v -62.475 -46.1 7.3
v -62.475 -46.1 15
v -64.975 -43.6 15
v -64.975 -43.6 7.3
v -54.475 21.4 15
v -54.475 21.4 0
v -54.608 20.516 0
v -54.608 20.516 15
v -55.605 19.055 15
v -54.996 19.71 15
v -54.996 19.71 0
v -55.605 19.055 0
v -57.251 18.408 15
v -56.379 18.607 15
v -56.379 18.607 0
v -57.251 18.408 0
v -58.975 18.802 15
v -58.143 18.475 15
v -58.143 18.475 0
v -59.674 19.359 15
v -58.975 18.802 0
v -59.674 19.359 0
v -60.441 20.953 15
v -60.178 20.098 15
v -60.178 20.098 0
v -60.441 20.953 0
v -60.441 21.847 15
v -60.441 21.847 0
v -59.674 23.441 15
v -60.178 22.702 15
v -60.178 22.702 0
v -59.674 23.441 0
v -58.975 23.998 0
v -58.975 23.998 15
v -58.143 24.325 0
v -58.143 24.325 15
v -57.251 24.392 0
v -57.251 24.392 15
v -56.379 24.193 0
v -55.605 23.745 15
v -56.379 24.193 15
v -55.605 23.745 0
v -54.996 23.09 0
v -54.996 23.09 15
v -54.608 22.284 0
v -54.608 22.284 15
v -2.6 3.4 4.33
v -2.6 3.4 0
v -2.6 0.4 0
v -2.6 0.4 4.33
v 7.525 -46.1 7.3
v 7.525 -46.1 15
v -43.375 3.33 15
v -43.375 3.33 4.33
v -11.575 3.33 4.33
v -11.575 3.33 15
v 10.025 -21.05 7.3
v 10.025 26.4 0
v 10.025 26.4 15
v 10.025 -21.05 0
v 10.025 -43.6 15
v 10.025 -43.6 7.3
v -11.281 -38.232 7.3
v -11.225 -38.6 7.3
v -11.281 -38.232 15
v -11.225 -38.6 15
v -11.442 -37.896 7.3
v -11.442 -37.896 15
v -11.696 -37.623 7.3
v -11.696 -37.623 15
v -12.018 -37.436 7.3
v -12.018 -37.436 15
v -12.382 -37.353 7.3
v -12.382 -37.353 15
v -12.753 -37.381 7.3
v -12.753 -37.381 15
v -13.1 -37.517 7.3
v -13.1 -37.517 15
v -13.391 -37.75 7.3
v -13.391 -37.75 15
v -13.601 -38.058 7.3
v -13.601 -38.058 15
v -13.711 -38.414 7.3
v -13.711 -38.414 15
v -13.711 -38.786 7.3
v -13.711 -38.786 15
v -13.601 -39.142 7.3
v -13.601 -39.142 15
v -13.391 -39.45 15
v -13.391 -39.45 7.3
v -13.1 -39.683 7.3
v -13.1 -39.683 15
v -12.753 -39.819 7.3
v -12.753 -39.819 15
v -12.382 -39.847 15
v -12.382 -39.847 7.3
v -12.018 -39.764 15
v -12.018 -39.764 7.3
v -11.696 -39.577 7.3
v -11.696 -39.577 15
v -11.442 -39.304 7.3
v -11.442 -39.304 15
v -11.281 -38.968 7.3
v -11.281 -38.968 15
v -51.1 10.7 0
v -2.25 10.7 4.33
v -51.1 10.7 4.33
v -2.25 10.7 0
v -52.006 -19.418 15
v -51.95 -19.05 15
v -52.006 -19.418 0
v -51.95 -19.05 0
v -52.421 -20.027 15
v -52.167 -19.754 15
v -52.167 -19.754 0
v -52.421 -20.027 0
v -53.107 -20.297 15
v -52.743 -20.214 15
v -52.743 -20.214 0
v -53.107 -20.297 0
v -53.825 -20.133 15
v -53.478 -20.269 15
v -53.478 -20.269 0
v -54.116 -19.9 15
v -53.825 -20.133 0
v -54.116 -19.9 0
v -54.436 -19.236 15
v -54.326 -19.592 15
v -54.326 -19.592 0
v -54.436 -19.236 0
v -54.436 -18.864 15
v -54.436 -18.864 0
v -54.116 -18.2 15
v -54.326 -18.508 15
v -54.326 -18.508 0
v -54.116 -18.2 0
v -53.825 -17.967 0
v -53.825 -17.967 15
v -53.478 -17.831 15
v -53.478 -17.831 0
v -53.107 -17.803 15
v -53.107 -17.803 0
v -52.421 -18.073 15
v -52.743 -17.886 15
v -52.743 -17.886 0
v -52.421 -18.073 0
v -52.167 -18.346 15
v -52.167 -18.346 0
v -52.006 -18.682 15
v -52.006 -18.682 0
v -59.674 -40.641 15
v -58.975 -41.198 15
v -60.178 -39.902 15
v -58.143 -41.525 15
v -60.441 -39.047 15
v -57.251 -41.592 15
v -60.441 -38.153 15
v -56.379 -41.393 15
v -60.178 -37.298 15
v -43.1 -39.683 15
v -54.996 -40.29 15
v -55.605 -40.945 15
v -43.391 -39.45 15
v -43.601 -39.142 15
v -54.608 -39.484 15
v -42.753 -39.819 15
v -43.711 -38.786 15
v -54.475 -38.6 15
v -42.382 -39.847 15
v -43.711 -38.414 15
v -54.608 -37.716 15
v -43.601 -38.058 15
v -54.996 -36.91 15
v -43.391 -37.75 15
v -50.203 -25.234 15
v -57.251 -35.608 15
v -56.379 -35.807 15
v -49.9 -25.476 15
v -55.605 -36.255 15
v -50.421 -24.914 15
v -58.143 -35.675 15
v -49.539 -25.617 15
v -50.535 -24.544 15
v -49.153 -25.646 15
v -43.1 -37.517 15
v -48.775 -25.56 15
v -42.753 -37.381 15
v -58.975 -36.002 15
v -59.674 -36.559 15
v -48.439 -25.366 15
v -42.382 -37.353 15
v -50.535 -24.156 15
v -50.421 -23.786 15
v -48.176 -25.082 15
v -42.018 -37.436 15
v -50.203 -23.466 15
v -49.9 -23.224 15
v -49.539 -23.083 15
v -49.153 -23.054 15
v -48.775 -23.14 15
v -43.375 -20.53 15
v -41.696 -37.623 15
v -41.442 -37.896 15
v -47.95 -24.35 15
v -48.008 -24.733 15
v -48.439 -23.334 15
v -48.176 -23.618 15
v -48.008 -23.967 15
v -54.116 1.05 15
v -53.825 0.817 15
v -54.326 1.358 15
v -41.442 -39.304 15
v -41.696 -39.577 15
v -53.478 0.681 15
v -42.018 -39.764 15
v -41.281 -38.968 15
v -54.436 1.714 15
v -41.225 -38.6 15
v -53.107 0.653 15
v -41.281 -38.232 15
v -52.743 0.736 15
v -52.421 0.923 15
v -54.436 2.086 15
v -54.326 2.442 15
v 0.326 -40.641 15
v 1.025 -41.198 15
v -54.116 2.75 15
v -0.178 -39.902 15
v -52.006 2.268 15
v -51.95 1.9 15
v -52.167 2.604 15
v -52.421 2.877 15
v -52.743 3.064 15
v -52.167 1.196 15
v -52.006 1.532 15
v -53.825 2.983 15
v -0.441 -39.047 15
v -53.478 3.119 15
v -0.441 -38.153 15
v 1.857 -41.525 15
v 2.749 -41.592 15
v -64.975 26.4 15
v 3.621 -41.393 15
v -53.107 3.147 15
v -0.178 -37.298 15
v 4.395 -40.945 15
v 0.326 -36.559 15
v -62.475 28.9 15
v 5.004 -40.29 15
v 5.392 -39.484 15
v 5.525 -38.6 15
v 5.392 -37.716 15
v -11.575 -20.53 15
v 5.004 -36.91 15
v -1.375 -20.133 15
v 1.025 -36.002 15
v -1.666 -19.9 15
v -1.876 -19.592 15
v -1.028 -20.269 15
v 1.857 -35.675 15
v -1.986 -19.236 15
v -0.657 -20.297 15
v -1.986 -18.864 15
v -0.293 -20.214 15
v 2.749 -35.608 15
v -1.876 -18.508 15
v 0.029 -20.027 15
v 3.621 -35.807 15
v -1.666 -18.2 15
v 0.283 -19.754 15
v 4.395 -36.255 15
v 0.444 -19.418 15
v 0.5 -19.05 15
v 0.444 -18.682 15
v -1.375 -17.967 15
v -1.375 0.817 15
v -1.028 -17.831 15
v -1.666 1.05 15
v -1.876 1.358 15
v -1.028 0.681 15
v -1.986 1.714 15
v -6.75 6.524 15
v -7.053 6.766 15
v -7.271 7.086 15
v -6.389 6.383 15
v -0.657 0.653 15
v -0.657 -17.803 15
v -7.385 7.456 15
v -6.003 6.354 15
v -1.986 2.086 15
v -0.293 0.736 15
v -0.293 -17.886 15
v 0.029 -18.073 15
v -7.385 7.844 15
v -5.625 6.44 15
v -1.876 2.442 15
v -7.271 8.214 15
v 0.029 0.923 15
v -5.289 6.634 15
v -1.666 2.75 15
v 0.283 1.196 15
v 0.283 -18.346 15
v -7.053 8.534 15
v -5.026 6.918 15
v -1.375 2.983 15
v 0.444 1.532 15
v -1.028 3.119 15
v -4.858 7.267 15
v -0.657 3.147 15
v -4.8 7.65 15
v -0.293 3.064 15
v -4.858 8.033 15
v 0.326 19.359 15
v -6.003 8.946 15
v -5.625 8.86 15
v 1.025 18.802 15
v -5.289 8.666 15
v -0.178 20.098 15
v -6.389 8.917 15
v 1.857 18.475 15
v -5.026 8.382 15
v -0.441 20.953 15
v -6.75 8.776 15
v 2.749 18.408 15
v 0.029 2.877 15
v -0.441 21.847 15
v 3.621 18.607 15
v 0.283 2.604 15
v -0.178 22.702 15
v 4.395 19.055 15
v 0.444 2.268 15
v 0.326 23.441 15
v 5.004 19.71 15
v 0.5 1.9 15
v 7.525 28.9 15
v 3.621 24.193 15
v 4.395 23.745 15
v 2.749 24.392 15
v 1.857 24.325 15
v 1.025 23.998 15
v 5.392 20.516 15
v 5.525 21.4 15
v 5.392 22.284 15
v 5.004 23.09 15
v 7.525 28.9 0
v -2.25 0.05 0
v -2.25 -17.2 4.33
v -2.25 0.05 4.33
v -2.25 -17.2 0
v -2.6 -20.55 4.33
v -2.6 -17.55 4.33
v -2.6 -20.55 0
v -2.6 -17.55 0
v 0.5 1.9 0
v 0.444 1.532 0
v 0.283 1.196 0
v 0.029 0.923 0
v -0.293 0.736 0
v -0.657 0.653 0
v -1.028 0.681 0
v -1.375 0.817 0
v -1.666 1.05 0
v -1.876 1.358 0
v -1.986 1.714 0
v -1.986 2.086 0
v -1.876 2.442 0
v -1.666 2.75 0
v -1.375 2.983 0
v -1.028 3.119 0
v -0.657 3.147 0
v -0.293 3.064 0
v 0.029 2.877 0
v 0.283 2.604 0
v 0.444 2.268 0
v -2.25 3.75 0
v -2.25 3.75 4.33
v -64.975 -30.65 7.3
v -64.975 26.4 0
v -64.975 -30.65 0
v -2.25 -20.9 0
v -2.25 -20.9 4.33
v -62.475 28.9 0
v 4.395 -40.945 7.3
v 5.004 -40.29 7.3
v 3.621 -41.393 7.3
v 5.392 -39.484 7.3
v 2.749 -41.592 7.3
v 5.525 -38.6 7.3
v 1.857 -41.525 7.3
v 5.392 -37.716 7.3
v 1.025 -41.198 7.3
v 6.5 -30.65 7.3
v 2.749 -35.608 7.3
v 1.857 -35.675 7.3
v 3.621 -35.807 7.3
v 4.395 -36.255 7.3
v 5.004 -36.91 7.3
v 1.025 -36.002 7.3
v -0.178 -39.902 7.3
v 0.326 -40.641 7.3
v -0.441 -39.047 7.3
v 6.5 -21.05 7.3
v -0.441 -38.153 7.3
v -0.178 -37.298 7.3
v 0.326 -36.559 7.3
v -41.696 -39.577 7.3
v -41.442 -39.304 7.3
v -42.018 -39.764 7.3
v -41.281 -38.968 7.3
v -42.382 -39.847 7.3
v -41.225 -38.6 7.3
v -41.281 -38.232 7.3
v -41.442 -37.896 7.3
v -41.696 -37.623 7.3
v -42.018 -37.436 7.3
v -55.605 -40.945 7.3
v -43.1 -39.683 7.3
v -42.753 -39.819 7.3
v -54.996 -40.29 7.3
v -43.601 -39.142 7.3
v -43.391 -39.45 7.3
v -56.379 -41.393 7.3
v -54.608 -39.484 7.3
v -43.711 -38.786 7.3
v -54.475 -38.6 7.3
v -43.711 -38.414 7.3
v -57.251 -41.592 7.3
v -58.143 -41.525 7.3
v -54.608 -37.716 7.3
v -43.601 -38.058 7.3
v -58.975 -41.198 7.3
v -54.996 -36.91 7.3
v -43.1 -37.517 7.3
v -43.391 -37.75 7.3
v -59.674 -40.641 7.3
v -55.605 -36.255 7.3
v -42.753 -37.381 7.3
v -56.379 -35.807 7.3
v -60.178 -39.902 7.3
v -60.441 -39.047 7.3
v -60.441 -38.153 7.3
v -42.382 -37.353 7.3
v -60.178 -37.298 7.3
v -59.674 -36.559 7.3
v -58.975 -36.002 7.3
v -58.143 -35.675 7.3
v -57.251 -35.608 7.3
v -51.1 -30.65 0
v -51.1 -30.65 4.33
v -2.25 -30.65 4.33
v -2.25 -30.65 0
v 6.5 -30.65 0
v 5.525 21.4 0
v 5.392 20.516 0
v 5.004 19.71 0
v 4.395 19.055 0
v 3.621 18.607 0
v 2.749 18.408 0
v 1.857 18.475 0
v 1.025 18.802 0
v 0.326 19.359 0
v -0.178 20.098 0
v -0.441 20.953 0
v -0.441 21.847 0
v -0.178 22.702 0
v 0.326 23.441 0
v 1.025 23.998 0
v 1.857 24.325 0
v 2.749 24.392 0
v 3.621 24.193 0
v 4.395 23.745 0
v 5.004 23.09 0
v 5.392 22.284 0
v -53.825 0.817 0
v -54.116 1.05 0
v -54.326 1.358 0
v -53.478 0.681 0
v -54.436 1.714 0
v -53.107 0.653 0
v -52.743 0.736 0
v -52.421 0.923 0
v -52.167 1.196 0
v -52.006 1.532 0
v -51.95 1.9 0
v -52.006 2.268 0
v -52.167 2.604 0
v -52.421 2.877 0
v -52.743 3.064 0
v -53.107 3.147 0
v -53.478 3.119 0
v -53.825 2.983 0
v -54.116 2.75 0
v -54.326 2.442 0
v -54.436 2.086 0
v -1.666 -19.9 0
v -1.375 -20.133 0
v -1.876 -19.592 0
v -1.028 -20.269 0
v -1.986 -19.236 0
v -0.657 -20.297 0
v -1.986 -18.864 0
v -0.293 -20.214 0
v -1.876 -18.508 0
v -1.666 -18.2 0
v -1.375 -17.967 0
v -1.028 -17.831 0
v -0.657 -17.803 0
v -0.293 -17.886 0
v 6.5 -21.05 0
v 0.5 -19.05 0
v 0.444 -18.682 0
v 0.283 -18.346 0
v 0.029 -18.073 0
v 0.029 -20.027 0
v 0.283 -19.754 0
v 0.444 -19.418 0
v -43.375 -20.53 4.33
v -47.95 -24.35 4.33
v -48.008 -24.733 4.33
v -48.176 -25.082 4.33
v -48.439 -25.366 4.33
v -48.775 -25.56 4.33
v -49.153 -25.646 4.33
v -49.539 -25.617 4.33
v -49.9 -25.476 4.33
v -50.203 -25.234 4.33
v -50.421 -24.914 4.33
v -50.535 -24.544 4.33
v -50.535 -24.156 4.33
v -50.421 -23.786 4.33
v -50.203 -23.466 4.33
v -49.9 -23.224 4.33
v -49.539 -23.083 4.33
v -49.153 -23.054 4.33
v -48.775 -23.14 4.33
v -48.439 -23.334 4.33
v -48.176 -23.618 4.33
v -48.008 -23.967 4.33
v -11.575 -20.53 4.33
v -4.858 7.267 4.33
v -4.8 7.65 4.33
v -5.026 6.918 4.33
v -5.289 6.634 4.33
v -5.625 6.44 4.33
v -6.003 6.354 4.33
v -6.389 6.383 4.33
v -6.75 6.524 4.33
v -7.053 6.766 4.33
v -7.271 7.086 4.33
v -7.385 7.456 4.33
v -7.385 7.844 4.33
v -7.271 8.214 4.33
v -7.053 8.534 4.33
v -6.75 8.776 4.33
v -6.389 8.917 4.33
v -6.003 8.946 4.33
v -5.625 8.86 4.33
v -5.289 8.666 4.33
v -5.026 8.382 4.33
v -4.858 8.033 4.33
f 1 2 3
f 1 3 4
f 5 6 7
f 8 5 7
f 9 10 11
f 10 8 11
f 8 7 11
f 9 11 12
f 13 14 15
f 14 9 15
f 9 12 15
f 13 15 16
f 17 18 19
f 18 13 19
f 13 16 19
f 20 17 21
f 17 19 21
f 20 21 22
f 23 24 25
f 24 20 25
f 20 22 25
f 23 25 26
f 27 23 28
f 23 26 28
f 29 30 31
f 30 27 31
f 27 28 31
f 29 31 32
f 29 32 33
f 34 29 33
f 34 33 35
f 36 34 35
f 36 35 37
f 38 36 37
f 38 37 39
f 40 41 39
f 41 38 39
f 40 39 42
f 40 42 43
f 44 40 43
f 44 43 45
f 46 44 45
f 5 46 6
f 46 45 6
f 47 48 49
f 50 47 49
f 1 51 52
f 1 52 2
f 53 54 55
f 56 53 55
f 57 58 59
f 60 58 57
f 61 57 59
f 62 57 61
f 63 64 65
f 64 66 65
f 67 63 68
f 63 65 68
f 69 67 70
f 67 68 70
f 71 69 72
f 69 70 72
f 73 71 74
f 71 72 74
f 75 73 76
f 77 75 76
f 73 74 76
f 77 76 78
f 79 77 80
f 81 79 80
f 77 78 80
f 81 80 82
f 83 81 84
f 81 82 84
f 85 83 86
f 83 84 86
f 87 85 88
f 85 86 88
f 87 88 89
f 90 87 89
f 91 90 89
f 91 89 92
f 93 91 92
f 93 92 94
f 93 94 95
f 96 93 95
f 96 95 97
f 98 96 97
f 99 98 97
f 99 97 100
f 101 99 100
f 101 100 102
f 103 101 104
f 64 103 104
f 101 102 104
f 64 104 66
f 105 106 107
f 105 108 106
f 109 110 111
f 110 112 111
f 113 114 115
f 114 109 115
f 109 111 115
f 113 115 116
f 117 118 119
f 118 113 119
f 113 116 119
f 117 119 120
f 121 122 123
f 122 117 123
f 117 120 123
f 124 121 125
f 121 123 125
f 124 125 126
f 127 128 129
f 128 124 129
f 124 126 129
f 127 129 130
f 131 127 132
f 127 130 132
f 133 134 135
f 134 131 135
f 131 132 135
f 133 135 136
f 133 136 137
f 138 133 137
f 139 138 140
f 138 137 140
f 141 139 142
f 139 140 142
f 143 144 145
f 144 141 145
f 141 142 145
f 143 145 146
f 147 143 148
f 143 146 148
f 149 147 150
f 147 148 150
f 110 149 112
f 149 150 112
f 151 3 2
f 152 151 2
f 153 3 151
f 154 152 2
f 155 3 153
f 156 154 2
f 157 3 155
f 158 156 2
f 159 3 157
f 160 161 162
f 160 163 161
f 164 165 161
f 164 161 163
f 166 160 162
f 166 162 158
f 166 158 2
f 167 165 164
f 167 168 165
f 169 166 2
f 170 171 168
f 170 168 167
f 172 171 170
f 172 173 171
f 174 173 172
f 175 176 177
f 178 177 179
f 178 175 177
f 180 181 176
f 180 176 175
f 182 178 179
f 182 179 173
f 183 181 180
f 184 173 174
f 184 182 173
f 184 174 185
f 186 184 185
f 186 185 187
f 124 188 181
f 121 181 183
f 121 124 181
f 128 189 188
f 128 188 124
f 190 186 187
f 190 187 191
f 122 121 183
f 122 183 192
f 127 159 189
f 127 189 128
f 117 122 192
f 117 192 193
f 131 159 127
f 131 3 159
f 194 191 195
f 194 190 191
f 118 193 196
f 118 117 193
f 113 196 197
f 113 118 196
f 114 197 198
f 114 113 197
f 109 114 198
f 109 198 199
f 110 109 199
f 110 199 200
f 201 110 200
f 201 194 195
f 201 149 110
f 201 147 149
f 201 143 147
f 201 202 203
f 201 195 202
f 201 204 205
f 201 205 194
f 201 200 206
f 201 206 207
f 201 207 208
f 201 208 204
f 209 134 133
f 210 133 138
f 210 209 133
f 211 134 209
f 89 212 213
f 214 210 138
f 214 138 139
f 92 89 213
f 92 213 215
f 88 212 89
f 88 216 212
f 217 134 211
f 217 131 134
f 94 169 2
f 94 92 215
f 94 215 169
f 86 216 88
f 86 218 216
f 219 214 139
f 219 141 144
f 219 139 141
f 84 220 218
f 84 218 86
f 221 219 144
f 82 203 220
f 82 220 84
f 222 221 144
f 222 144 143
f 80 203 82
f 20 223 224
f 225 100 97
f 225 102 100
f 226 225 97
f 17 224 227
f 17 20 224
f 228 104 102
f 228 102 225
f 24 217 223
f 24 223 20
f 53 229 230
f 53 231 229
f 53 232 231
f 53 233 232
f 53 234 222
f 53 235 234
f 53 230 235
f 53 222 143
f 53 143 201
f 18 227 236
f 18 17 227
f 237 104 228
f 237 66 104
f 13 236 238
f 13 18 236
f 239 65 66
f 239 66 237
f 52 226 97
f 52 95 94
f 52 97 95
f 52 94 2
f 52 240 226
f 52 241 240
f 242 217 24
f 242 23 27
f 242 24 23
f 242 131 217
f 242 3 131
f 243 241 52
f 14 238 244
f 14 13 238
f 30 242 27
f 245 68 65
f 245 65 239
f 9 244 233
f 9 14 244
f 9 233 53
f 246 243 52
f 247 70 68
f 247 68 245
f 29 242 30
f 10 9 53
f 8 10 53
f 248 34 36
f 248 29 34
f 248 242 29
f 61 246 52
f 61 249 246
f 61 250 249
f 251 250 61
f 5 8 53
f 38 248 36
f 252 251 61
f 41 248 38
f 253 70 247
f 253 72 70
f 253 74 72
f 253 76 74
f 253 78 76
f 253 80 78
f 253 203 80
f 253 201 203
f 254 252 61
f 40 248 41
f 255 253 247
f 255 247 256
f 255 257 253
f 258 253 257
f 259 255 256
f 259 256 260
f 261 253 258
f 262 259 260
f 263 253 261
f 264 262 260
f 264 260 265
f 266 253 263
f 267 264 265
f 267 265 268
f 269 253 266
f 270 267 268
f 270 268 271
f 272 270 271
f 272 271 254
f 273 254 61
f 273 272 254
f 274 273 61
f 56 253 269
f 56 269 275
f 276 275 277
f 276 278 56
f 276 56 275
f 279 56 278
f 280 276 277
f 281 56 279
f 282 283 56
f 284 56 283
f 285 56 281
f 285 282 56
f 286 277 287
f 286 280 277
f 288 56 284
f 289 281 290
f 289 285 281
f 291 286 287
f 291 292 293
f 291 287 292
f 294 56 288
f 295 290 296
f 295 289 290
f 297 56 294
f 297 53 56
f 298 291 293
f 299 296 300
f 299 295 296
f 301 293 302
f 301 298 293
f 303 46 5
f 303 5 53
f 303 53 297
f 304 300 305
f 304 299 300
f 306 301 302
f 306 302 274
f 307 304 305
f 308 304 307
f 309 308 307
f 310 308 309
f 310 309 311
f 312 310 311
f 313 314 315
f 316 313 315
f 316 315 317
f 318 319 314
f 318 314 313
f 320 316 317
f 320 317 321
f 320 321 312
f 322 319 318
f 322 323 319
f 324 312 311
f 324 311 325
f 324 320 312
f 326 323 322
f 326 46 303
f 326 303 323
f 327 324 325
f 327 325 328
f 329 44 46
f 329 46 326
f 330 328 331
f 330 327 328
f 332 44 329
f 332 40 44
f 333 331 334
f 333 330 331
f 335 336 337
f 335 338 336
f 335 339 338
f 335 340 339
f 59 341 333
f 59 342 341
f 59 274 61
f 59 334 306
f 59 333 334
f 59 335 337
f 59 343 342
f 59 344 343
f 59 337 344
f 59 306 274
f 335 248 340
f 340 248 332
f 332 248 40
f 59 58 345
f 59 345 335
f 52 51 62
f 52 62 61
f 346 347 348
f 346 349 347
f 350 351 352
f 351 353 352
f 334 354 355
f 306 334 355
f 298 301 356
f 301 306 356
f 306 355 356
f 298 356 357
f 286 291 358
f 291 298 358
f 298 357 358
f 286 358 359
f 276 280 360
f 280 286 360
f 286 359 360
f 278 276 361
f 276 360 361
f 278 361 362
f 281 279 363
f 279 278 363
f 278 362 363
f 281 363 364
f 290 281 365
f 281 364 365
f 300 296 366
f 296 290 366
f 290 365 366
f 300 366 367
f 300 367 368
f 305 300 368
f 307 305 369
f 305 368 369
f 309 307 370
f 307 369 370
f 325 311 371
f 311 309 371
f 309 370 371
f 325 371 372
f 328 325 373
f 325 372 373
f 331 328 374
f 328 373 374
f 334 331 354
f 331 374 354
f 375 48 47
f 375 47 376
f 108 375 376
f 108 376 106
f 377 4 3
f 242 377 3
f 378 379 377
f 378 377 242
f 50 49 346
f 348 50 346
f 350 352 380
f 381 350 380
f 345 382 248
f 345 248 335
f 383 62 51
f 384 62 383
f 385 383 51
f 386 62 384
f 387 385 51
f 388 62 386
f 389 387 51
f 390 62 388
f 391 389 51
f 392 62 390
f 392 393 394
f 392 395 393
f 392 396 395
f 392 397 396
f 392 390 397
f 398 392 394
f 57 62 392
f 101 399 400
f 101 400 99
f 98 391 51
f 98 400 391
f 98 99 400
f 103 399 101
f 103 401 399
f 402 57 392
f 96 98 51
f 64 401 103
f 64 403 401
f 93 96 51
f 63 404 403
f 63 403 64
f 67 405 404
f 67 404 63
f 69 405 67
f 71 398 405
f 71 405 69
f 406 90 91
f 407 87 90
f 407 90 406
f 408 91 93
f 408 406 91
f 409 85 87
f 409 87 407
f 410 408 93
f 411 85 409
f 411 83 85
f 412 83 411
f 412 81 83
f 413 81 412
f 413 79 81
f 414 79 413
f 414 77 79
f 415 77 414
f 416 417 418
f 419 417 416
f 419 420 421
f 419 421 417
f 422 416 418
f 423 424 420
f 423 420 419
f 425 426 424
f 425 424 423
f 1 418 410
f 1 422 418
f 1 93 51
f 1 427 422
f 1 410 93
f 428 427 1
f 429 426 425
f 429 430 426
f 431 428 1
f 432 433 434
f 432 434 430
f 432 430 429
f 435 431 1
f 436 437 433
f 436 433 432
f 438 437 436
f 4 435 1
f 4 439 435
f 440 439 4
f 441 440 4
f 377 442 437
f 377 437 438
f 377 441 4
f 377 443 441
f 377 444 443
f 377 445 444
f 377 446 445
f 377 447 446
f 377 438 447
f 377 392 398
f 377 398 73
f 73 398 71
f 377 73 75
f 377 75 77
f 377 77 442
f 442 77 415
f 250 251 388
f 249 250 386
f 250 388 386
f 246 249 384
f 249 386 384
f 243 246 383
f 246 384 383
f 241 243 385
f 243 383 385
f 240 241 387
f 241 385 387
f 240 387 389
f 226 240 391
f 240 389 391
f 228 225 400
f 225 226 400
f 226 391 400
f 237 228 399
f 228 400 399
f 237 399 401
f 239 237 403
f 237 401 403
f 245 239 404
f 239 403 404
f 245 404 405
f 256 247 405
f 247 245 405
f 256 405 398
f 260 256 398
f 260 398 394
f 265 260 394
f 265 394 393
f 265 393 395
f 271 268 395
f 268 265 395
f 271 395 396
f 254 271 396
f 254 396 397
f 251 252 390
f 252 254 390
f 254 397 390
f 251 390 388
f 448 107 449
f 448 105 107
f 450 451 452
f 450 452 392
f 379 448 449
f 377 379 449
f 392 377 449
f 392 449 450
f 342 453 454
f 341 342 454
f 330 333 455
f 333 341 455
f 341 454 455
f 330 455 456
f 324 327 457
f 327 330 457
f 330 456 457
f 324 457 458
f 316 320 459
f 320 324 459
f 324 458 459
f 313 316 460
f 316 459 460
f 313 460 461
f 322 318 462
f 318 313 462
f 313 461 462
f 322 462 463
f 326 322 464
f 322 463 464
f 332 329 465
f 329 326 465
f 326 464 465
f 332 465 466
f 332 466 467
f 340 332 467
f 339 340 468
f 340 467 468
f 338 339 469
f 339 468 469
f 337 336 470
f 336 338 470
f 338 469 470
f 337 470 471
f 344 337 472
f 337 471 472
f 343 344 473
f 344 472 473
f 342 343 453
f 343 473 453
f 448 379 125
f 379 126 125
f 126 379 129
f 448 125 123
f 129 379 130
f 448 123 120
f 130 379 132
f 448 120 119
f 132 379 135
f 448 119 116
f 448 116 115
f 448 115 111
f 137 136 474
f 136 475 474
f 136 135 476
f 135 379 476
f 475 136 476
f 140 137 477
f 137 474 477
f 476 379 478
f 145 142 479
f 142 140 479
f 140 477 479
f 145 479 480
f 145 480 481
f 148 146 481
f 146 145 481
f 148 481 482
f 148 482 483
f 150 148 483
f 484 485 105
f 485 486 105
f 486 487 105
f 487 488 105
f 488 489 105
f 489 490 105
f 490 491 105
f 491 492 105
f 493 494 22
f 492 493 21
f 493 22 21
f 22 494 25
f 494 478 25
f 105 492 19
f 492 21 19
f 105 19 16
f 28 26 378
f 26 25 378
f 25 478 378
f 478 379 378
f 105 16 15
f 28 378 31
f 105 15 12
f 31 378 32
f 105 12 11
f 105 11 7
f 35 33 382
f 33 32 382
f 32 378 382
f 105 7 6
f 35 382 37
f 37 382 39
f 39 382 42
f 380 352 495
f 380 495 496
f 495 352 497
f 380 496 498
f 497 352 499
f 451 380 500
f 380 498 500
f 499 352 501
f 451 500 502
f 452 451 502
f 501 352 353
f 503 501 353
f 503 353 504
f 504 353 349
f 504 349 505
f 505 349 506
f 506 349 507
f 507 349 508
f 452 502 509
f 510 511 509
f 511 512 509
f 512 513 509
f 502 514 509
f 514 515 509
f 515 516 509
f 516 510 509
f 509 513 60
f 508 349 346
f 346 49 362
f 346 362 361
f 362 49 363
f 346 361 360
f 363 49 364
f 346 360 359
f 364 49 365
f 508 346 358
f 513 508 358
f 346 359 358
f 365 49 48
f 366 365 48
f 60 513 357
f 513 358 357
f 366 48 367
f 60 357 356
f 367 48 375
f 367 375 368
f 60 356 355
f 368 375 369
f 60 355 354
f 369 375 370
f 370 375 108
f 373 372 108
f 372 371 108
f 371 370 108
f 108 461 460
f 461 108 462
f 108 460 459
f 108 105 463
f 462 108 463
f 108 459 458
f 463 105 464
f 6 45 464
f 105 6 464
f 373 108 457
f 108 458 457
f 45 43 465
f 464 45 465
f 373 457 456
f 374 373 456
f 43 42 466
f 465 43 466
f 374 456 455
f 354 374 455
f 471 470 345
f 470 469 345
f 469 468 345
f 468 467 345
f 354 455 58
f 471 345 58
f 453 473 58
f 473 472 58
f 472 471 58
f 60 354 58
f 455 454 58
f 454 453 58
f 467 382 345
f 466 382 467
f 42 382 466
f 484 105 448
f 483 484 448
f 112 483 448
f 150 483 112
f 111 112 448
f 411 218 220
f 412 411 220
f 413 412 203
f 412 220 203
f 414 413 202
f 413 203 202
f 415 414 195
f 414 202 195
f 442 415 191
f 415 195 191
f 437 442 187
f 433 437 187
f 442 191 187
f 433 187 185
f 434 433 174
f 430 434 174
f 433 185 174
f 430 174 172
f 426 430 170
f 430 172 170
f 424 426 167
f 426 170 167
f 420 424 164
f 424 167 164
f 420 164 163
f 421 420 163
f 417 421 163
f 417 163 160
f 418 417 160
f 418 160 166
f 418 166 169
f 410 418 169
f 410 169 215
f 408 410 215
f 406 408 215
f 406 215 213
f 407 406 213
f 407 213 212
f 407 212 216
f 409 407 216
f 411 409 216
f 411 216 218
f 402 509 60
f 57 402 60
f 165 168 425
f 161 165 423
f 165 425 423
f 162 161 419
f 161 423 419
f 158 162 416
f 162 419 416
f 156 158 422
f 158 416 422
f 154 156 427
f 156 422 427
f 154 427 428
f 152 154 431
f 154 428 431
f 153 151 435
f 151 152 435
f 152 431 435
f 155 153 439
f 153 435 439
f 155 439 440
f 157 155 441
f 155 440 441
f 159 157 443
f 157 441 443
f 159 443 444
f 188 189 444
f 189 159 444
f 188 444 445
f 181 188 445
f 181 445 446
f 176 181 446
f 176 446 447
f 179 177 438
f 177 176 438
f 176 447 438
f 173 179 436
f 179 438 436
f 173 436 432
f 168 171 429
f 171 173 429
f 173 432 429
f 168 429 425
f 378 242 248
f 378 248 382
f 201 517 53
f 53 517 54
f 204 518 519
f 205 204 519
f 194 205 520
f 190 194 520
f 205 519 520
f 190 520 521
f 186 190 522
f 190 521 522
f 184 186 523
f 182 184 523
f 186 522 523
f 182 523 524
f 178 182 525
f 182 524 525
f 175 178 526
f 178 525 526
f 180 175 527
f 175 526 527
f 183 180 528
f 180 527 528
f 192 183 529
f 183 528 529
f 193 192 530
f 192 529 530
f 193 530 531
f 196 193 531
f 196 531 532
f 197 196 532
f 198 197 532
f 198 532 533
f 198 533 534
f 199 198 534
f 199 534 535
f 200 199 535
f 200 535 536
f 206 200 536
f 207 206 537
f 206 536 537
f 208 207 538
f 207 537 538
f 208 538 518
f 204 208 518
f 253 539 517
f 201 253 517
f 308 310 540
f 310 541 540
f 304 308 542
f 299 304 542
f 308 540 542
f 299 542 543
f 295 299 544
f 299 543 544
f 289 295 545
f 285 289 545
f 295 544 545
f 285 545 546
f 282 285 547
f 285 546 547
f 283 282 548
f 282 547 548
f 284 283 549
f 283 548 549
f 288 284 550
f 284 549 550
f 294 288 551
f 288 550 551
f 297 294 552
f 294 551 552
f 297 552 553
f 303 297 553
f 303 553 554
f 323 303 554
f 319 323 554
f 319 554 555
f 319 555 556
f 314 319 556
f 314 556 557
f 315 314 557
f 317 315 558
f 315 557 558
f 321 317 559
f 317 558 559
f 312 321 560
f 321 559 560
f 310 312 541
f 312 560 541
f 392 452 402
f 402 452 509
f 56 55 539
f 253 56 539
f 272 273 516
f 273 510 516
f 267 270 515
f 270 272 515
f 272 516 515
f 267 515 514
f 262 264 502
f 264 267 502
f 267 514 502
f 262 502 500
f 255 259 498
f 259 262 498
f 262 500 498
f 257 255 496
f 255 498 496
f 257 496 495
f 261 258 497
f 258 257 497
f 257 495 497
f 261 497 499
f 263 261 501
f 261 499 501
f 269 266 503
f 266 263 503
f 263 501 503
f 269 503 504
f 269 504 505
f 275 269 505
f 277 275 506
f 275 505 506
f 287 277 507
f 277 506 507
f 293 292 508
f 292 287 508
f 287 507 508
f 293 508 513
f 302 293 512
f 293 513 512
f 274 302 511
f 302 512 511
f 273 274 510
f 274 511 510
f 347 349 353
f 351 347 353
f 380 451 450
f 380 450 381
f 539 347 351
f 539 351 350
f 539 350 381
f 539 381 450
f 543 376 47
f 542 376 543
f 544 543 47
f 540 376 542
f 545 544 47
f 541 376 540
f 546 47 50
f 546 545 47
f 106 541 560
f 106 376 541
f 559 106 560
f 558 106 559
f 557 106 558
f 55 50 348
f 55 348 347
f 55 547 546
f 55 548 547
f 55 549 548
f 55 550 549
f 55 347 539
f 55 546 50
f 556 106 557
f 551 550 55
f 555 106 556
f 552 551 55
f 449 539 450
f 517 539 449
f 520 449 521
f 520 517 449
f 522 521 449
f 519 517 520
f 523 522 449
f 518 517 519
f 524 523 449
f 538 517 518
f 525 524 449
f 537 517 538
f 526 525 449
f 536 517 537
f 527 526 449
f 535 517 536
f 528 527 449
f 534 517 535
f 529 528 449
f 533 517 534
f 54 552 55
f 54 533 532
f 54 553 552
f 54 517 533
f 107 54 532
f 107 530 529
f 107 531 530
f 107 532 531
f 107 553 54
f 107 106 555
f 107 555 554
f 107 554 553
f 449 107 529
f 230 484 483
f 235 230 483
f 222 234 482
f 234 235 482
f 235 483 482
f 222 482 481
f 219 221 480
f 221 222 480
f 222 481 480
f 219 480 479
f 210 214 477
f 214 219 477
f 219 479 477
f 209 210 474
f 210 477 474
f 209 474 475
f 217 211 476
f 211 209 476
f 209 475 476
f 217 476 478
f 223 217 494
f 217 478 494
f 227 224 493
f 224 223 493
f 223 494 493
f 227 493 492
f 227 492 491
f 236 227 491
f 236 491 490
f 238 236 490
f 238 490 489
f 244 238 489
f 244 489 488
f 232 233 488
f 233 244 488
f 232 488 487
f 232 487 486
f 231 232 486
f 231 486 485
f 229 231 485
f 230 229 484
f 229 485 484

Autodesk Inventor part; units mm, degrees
ref_plane "YZ Plane" through (0, 0, 0) normal (1, 0, 0) x (0, 1, 0)
ref_plane "XZ Plane" through (0, 0, 0) normal (0, 1, 0) x (-1, 0, 0)
ref_plane "Płaszczyzna konstrukcyjna1" through (0, 0, 0) normal (0, 0, 1) x (1, 0, 0)
sketch "Szkic1" plane through (0, 0, 0) normal (0, 0, 1) x (1, 0, 0)
  circle A0 centre (-0.75, -19.05) radius 2 projected
  circle A1 centre (-0.75, 1.9) radius 2 projected
  circle A2 centre (-53.2, 1.9) radius 2 projected
  circle A3 centre (-53.2, -19.05) radius 2 projected
  arc A4 (-7.07, 6.8616) -> (-7.3, 7.3) centre (-6.1, 7.65) ccw projected
  line L0 (-7.07, 6.8616) -> (-7.07, -24.52) projected
  line L1 (-7.07, -24.52) -> (-47.8, -24.52) projected
  line L2 (-47.8, -24.52) -> (-47.8, 7.3) projected
  line L3 (-47.8, 7.3) -> (-7.3, 7.3) projected
  arc A5 (-49.8576, -25.4424) -> (-50.3424, -24.9576) centre (-49.25, -24.35) ccw projected
  line L4 (-49.8576, -25.4424) -> (-47.9, -27.4) projected
  line L5 (-47.9, -27.4) -> (-33.9, -27.4) projected
  line L6 (-33.9, -27.4) -> (-30.0895, -29.6) projected
  line L7 (-30.0895, -29.6) -> (-13.35, -29.6) projected
  line L8 (-13.35, -29.6) -> (-11.15, -27.4) projected
  line L9 (-11.15, -27.4) -> (-7.15, -27.4) projected
  line L10 (-7.15, -27.4) -> (-2.65, -22.9) projected
  line L11 (-2.65, -22.9) -> (-2.65, 6.4) projected
  line L12 (-2.65, 6.4) -> (-6.65, 10.4) projected
  line L13 (-6.65, 10.4) -> (-47.9, 10.4) projected
  arc A6 (-47.9, 10.4) -> (-50.9, 7.4) centre (-47.9, 7.4) ccw projected
  line L14 (-50.9, 7.4) -> (-50.9, -24.4) projected
  line L15 (-50.9, -24.4) -> (-50.3424, -24.9576) projected
  line L16 (-50.3424, -24.9576) -> (-49.8576, -25.4424) projected
  arc A7 (-49.8576, -25.4424) -> (-50.3424, -24.9576) centre (-49.25, -24.35) ccw projected
  line L17 (-42.875, -20.03) -> (-42.875, 2.83) projected
  line L18 (-42.875, 2.83) -> (-12.075, 2.83) projected
  line L19 (-12.075, 2.83) -> (-12.075, -20.03) projected
  line L20 (-12.075, -20.03) -> (-42.875, -20.03) projected
  line L21 (-45.382, -22.57) -> (-9.568, -22.57) projected
  line L22 (-9.568, -22.57) -> (-9.568, 5.37) projected
  line L23 (-9.568, 5.37) -> (-45.382, 5.37) projected
  line L24 (-45.382, 5.37) -> (-45.382, -22.57) projected
  arc A8 (-18.975, -17.3) -> (-14.775, -13.1) centre (-18.975, -13.1) ccw projected
  line L25 (-18.975, -17.3) -> (-35.975, -17.3) projected
  arc A9 (-40.175, -13.1) -> (-35.975, -17.3) centre (-35.975, -13.1) ccw projected
  line L26 (-40.175, -13.1) -> (-40.175, -4.1) projected
  arc A10 (-35.975, 0.1) -> (-40.175, -4.1) centre (-35.975, -4.1) ccw projected
  line L27 (-35.975, 0.1) -> (-18.975, 0.1) projected
  arc A11 (-14.775, -4.1) -> (-18.975, 0.1) centre (-18.975, -4.1) ccw projected
  line L28 (-14.775, -4.1) -> (-14.775, -13.1) projected
  line L29 (-42.875, -20.03) -> (-12.075, -20.03) projected
  line L30 (-12.075, -20.03) -> (-12.075, 2.83) projected
  line L31 (-12.075, 2.83) -> (-42.875, 2.83) projected
  line L32 (-42.875, 2.83) -> (-42.875, -20.03) projected
  line L33 (-62.5, -30.65) -> (-6.9, -30.65) construction
  line L34 (-62.5, 29.05) -> (-62.5, -29.05) projected
  line L35 (-62.5, -29.05) -> (8.2, -29.05) projected
  circle A12 centre (-0.75, -19.05) radius 1.25
  circle A13 centre (-0.75, 1.9) radius 1.25
  circle A14 centre (-53.2, 1.9) radius 1.25
  circle A15 centre (-53.2, -19.05) radius 1.25
  circle A16 centre (-49.25, -24.35) radius 1.3
  circle A17 centre (-6.1, 7.65) radius 1.3
  line L36 (-11.575, -20.53) -> (-43.375, -20.53)
  line L37 (-43.375, -20.53) -> (-43.375, 3.33)
  line L38 (-43.375, 3.33) -> (-11.575, 3.33)
  line L39 (-11.575, 3.33) -> (-11.575, -20.53)
  line L40 (-27.475, -20.03) -> (-27.475, 2.83) construction
  line L41 (-11.575, -8.6) -> (-43.375, -8.6) construction
  line L42 (2.525, -38.6) -> (-57.475, -38.6) construction
  line L43 (-57.475, -38.6) -> (-57.475, 21.4) construction
  line L44 (-57.475, 21.4) -> (2.525, 21.4) construction
  line L45 (2.525, 21.4) -> (2.525, -38.6) construction
  line L46 (2.525, -38.6) -> (-57.475, 21.4) construction
  line L47 (-57.475, -38.6) -> (2.525, 21.4) construction
  line L48 (10.025, -46.1) -> (-64.975, -46.1)
  line L49 (-64.975, -46.1) -> (-64.975, 28.9)
  line L50 (-64.975, 28.9) -> (10.025, 28.9)
  line L51 (10.025, 28.9) -> (10.025, -46.1)
  line L52 (10.025, -46.1) -> (-64.975, 28.9) construction
  line L53 (-64.975, -46.1) -> (10.025, 28.9) construction
  circle A18 centre (-57.475, 21.4) radius 3
  circle A19 centre (2.525, 21.4) radius 3
  circle A20 centre (2.525, -38.6) radius 3
  circle A21 centre (-57.475, -38.6) radius 3
  line L54 (-2.35, -32.15) -> (-51.2, -32.15)
  line L55 (-51.2, -32.15) -> (-51.2, 10.7)
  line L56 (-51.2, 10.7) -> (-2.35, 10.7)
  line L57 (-62.5, -32.15) -> (147.5, -32.15) projected
  circle A22 centre (-0.75, 1.9) radius 1.5 construction
  line L58 (-2.35, 3.1) -> (-2.65, 2.5245)
  line L59 (-2.65, 2.5245) -> (-2.65, 1.2755)
  line L60 (-2.65, 1.2755) -> (-2.35, 0.7)
  line L61 (-2.35, -17.85) -> (-2.65, -18.4255)
  line L62 (-2.65, -18.4255) -> (-2.65, -19.6745)
  line L63 (-2.65, -19.6745) -> (-2.35, -20.25)
  line L64 (-2.35, -20.25) -> (-2.35, -32.15)
  line L65 (-2.35, 10.7) -> (-2.35, 3.1)
  line L66 (-2.35, 0.7) -> (-2.35, -17.85)
  point P0 (0, 0)
  point P1 (-27.475, -8.6)
  dimension "d0" = 2.5
  dimension "d1" = 2.6
  dimension "d2" = 2.6
  dimension "d3" = 0.5
  dimension "d4" = 0.5
  dimension "d5" = 0.5
  dimension "d6" = 0.5
  dimension "d7" = 60
  dimension "d8" = 75
  dimension "d9" = 6
  dimension "d10" = 0.3
  dimension "d12" = 0.3
  dimension "d36" = 3
  dimension "d37" = 0.3
extrude "Wyciągnięcie proste1" add sketch "Szkic1" along normal blind 15 contours A0 L63 L11 L61 | A3 | A2 | A0 L66 A1 L65 L56 L55 L35 L34 L50 L51 L57 L64 | L61 A0 | A0 L11 A1 L66 | L64 L35 L8 L9 L10 L11 A0 | A0 L63 | L11 A0 | A0 L11 L10 L9 L8 L35 L6 L5 L4 A16 L15 L14 A6 L13 L12 A1 | L60 L11 L58 A1 | A1 L60 | L64 L54 L55 L35 L6 L7 L8 | A1 L11 | L8 L7 L6 L35 | L57 L51 L48 L49 L50 L34 L35 L55 L54 | L11 L12 L13 A6 L14 L15 A16 L4 L5 L6 L35 L55 L56 L65 A1 | A1 L58 | L0 L1 L2 L3 A17 | L24 L23 L22 L21
sketch "Szkic2" plane through (0, 0, 0) normal (0, 0, -1) x (-1, 0, 0)
  line L0 (64.975, 28.9) -> (64.975, -46.1) projected
  line L1 (-10.025, 28.9) -> (64.975, 28.9) projected
  line L2 (-10.025, -46.1) -> (-10.025, 28.9) projected
  line L3 (64.975, -46.1) -> (-10.025, -46.1) projected
  line L4 (11.575, -20.53) -> (43.375, -20.53) projected
  line L5 (11.575, 3.33) -> (11.575, -20.53) projected
  line L6 (43.375, 3.33) -> (11.575, 3.33) projected
  line L7 (43.375, -20.53) -> (43.375, 3.33) projected
  circle A0 centre (49.25, -24.35) radius 1.3 projected
  circle A1 centre (57.475, -38.6) radius 3 projected
  circle A2 centre (-2.525, -38.6) radius 3 projected
  circle A3 centre (-2.525, 21.4) radius 3 projected
  circle A4 centre (57.475, 21.4) radius 3 projected
  circle A5 centre (0.75, 1.9) radius 1.25 projected
  circle A6 centre (0.75, -19.05) radius 1.25 projected
  circle A7 centre (53.2, -19.05) radius 1.25 projected
  circle A8 centre (53.2, 1.9) radius 1.25 projected
  circle A9 centre (6.1, 7.65) radius 1.3 projected
  line L8 (6.65, 10.4) -> (47.9, 10.4) projected
  arc A10 (50.9, 7.4) -> (47.9, 10.4) centre (47.9, 7.4) ccw projected
  line L9 (50.9, 7.4) -> (50.9, -24.4) projected
  line L10 (2.65, 6.4) -> (6.65, 10.4) projected
  line L11 (2.65, -22.9) -> (2.65, 6.4) projected
  line L12 (7.15, -27.4) -> (2.65, -22.9) projected
  line L13 (11.15, -27.4) -> (7.15, -27.4) projected
  line L14 (13.35, -29.6) -> (11.15, -27.4) projected
  line L15 (50.9, -24.4) -> (47.9, -27.4) projected
  line L16 (47.9, -27.4) -> (33.9, -27.4) projected
  line L17 (33.9, -27.4) -> (30.0895, -29.6) projected
  line L18 (30.0895, -29.6) -> (13.35, -29.6) projected
  line L19 (2.25, 10.7) -> (51.1, 10.7)
  line L20 (51.1, 10.7) -> (51.1, -34.4144)
  line L21 (51.1, -34.4144) -> (2.25, -34.4144)
  line L22 (62.5, -30.65) -> (6.9, -30.65) construction
  line L23 (62.5, -32.15) -> (-147.5, -32.15) construction
  circle A11 centre (0.75, 1.9) radius 1.5 construction
  circle A12 centre (0.75, -19.05) radius 1.5 construction
  line L24 (2.6, 3.4) -> (2.6, 0.4)
  line L25 (2.6, 0.4) -> (2.25, 0.05)
  line L26 (2.6, 3.4) -> (2.25, 3.75)
  line L27 (2.25, -17.2) -> (2.6, -17.55)
  line L28 (2.6, -17.55) -> (2.6, -20.55)
  line L29 (2.6, -20.55) -> (2.25, -20.9)
  line L30 (2.25, 3.75) -> (2.25, 10.7)
  line L31 (2.25, -34.4144) -> (2.25, -20.9)
  line L32 (2.25, -17.2) -> (2.25, 0.05)
  point P0 (0, 0)
  point P1 (2.6, 1.9)
  point P2 (2.6, -19.05)
  dimension "d15" = 0.2
  dimension "d16" = 0.3
  dimension "d38" = 3
  dimension "d39" = 3
  dimension "d40" = 3
  dimension "d41" = 3
  dimension "d43" = 0.05
  dimension "d44" = 48.85
  dimension "d45" = 45
  dimension "d46" = 45
extrude "Wyciągnięcie proste2" cut sketch "Szkic2" against normal blind 4.33 contours A0 L15 L16 L17 L18 L14 L13 L12 L11 L10 L8 A10 L9 | L19 L20 L21 L31 L29 L28 L27 L32 L25 L24 L26 L30
sketch "Szkic3" plane through (-64.975, -46.1, 0) normal (-1, 0, 0) x (0, 0, 1)
  line L0 (0, 75) -> (0, 0) projected
  line L1 (0, 0) -> (15, 0) projected
  line L2 (0, 15.45) -> (7.3, 15.45)
  line L3 (7.3, 15.45) -> (7.3, 0)
  line L4 (7.3, 0) -> (0, 0)
  line L5 (0, 0) -> (0, 15.45)
  line L6 (-98.1, 15.45) -> (7, 15.45) projected
  line L7 (7, 15.45) -> (7, 13.95) projected
  line L8 (-98.1, 13.95) -> (7, 13.95) projected
  line L9 (-98.1, 15.45) -> (-98.1, 13.95) projected
  point P0 (0, 46.1)
  dimension "d22" = 0.3
extrude "Wyciągnięcie proste3" cut sketch "Szkic3" against normal up to next contours L2 L7 L8 L0 | L8 L7 L2 L3 L1 L0
chamfer "Faza1" distance 2.5 angle 45 4 edges at (-64.975, 28.9, 7.5) (-64.975, -46.1, 11.15) (10.025, -46.1, 11.15) (10.025, 28.9, 7.5)
sketch "Szkic4" plane through (0, 0, 0) normal (0, 0, -1) x (-1, 0, 0)
  line L0 (-8.5, -30.65) -> (-64.1, -30.65) construction
  line L1 (-8.5, -30.65) -> (-8.5, -22.05) construction
  line L2 (-64.1, -22.05) -> (-8.5, -22.05) construction
  line L3 (-64.1, -30.65) -> (-64.1, -22.05) construction
  line L4 (-10.025, -30.65) -> (-10.025, 26.4) projected
  line L5 (-10.025, -30.65) -> (-6.5, -30.65)
  line L6 (-6.5, -30.65) -> (-6.5, -21.05)
  line L7 (-6.5, -21.05) -> (-10.025, -21.05)
  line L8 (-10.025, -21.05) -> (-10.025, -30.65)
  point P0 (0, 0)
  point P1 (-8.2625, -21.05)
  dimension "d26" = 1
  dimension "d27" = 2
extrude "Wyciągnięcie proste4" cut sketch "Szkic4" against normal up to surface (7.3 mm away)
sketch "Szkic6" plane through (0, 0, 15) normal (0, 0, 1) x (1, 0, 0)
  circle A0 centre (-57.475, -38.6) radius 3 construction
  circle A1 centre (2.525, -38.6) radius 3 construction
  line L0 (-57.475, -38.6) -> (2.525, -38.6) construction
  circle A2 centre (-42.475, -38.6) radius 1.25
  circle A3 centre (-12.475, -38.6) radius 1.25
  point P0 (0, 0)
  dimension "d30" = 2.5
  dimension "d31" = 15
  dimension "d32" = 2.5
  dimension "d33" = 15
extrude "Wyciągnięcie proste5" cut sketch "Szkic6" against normal up to next
properties part number "mocowanie_2000"
